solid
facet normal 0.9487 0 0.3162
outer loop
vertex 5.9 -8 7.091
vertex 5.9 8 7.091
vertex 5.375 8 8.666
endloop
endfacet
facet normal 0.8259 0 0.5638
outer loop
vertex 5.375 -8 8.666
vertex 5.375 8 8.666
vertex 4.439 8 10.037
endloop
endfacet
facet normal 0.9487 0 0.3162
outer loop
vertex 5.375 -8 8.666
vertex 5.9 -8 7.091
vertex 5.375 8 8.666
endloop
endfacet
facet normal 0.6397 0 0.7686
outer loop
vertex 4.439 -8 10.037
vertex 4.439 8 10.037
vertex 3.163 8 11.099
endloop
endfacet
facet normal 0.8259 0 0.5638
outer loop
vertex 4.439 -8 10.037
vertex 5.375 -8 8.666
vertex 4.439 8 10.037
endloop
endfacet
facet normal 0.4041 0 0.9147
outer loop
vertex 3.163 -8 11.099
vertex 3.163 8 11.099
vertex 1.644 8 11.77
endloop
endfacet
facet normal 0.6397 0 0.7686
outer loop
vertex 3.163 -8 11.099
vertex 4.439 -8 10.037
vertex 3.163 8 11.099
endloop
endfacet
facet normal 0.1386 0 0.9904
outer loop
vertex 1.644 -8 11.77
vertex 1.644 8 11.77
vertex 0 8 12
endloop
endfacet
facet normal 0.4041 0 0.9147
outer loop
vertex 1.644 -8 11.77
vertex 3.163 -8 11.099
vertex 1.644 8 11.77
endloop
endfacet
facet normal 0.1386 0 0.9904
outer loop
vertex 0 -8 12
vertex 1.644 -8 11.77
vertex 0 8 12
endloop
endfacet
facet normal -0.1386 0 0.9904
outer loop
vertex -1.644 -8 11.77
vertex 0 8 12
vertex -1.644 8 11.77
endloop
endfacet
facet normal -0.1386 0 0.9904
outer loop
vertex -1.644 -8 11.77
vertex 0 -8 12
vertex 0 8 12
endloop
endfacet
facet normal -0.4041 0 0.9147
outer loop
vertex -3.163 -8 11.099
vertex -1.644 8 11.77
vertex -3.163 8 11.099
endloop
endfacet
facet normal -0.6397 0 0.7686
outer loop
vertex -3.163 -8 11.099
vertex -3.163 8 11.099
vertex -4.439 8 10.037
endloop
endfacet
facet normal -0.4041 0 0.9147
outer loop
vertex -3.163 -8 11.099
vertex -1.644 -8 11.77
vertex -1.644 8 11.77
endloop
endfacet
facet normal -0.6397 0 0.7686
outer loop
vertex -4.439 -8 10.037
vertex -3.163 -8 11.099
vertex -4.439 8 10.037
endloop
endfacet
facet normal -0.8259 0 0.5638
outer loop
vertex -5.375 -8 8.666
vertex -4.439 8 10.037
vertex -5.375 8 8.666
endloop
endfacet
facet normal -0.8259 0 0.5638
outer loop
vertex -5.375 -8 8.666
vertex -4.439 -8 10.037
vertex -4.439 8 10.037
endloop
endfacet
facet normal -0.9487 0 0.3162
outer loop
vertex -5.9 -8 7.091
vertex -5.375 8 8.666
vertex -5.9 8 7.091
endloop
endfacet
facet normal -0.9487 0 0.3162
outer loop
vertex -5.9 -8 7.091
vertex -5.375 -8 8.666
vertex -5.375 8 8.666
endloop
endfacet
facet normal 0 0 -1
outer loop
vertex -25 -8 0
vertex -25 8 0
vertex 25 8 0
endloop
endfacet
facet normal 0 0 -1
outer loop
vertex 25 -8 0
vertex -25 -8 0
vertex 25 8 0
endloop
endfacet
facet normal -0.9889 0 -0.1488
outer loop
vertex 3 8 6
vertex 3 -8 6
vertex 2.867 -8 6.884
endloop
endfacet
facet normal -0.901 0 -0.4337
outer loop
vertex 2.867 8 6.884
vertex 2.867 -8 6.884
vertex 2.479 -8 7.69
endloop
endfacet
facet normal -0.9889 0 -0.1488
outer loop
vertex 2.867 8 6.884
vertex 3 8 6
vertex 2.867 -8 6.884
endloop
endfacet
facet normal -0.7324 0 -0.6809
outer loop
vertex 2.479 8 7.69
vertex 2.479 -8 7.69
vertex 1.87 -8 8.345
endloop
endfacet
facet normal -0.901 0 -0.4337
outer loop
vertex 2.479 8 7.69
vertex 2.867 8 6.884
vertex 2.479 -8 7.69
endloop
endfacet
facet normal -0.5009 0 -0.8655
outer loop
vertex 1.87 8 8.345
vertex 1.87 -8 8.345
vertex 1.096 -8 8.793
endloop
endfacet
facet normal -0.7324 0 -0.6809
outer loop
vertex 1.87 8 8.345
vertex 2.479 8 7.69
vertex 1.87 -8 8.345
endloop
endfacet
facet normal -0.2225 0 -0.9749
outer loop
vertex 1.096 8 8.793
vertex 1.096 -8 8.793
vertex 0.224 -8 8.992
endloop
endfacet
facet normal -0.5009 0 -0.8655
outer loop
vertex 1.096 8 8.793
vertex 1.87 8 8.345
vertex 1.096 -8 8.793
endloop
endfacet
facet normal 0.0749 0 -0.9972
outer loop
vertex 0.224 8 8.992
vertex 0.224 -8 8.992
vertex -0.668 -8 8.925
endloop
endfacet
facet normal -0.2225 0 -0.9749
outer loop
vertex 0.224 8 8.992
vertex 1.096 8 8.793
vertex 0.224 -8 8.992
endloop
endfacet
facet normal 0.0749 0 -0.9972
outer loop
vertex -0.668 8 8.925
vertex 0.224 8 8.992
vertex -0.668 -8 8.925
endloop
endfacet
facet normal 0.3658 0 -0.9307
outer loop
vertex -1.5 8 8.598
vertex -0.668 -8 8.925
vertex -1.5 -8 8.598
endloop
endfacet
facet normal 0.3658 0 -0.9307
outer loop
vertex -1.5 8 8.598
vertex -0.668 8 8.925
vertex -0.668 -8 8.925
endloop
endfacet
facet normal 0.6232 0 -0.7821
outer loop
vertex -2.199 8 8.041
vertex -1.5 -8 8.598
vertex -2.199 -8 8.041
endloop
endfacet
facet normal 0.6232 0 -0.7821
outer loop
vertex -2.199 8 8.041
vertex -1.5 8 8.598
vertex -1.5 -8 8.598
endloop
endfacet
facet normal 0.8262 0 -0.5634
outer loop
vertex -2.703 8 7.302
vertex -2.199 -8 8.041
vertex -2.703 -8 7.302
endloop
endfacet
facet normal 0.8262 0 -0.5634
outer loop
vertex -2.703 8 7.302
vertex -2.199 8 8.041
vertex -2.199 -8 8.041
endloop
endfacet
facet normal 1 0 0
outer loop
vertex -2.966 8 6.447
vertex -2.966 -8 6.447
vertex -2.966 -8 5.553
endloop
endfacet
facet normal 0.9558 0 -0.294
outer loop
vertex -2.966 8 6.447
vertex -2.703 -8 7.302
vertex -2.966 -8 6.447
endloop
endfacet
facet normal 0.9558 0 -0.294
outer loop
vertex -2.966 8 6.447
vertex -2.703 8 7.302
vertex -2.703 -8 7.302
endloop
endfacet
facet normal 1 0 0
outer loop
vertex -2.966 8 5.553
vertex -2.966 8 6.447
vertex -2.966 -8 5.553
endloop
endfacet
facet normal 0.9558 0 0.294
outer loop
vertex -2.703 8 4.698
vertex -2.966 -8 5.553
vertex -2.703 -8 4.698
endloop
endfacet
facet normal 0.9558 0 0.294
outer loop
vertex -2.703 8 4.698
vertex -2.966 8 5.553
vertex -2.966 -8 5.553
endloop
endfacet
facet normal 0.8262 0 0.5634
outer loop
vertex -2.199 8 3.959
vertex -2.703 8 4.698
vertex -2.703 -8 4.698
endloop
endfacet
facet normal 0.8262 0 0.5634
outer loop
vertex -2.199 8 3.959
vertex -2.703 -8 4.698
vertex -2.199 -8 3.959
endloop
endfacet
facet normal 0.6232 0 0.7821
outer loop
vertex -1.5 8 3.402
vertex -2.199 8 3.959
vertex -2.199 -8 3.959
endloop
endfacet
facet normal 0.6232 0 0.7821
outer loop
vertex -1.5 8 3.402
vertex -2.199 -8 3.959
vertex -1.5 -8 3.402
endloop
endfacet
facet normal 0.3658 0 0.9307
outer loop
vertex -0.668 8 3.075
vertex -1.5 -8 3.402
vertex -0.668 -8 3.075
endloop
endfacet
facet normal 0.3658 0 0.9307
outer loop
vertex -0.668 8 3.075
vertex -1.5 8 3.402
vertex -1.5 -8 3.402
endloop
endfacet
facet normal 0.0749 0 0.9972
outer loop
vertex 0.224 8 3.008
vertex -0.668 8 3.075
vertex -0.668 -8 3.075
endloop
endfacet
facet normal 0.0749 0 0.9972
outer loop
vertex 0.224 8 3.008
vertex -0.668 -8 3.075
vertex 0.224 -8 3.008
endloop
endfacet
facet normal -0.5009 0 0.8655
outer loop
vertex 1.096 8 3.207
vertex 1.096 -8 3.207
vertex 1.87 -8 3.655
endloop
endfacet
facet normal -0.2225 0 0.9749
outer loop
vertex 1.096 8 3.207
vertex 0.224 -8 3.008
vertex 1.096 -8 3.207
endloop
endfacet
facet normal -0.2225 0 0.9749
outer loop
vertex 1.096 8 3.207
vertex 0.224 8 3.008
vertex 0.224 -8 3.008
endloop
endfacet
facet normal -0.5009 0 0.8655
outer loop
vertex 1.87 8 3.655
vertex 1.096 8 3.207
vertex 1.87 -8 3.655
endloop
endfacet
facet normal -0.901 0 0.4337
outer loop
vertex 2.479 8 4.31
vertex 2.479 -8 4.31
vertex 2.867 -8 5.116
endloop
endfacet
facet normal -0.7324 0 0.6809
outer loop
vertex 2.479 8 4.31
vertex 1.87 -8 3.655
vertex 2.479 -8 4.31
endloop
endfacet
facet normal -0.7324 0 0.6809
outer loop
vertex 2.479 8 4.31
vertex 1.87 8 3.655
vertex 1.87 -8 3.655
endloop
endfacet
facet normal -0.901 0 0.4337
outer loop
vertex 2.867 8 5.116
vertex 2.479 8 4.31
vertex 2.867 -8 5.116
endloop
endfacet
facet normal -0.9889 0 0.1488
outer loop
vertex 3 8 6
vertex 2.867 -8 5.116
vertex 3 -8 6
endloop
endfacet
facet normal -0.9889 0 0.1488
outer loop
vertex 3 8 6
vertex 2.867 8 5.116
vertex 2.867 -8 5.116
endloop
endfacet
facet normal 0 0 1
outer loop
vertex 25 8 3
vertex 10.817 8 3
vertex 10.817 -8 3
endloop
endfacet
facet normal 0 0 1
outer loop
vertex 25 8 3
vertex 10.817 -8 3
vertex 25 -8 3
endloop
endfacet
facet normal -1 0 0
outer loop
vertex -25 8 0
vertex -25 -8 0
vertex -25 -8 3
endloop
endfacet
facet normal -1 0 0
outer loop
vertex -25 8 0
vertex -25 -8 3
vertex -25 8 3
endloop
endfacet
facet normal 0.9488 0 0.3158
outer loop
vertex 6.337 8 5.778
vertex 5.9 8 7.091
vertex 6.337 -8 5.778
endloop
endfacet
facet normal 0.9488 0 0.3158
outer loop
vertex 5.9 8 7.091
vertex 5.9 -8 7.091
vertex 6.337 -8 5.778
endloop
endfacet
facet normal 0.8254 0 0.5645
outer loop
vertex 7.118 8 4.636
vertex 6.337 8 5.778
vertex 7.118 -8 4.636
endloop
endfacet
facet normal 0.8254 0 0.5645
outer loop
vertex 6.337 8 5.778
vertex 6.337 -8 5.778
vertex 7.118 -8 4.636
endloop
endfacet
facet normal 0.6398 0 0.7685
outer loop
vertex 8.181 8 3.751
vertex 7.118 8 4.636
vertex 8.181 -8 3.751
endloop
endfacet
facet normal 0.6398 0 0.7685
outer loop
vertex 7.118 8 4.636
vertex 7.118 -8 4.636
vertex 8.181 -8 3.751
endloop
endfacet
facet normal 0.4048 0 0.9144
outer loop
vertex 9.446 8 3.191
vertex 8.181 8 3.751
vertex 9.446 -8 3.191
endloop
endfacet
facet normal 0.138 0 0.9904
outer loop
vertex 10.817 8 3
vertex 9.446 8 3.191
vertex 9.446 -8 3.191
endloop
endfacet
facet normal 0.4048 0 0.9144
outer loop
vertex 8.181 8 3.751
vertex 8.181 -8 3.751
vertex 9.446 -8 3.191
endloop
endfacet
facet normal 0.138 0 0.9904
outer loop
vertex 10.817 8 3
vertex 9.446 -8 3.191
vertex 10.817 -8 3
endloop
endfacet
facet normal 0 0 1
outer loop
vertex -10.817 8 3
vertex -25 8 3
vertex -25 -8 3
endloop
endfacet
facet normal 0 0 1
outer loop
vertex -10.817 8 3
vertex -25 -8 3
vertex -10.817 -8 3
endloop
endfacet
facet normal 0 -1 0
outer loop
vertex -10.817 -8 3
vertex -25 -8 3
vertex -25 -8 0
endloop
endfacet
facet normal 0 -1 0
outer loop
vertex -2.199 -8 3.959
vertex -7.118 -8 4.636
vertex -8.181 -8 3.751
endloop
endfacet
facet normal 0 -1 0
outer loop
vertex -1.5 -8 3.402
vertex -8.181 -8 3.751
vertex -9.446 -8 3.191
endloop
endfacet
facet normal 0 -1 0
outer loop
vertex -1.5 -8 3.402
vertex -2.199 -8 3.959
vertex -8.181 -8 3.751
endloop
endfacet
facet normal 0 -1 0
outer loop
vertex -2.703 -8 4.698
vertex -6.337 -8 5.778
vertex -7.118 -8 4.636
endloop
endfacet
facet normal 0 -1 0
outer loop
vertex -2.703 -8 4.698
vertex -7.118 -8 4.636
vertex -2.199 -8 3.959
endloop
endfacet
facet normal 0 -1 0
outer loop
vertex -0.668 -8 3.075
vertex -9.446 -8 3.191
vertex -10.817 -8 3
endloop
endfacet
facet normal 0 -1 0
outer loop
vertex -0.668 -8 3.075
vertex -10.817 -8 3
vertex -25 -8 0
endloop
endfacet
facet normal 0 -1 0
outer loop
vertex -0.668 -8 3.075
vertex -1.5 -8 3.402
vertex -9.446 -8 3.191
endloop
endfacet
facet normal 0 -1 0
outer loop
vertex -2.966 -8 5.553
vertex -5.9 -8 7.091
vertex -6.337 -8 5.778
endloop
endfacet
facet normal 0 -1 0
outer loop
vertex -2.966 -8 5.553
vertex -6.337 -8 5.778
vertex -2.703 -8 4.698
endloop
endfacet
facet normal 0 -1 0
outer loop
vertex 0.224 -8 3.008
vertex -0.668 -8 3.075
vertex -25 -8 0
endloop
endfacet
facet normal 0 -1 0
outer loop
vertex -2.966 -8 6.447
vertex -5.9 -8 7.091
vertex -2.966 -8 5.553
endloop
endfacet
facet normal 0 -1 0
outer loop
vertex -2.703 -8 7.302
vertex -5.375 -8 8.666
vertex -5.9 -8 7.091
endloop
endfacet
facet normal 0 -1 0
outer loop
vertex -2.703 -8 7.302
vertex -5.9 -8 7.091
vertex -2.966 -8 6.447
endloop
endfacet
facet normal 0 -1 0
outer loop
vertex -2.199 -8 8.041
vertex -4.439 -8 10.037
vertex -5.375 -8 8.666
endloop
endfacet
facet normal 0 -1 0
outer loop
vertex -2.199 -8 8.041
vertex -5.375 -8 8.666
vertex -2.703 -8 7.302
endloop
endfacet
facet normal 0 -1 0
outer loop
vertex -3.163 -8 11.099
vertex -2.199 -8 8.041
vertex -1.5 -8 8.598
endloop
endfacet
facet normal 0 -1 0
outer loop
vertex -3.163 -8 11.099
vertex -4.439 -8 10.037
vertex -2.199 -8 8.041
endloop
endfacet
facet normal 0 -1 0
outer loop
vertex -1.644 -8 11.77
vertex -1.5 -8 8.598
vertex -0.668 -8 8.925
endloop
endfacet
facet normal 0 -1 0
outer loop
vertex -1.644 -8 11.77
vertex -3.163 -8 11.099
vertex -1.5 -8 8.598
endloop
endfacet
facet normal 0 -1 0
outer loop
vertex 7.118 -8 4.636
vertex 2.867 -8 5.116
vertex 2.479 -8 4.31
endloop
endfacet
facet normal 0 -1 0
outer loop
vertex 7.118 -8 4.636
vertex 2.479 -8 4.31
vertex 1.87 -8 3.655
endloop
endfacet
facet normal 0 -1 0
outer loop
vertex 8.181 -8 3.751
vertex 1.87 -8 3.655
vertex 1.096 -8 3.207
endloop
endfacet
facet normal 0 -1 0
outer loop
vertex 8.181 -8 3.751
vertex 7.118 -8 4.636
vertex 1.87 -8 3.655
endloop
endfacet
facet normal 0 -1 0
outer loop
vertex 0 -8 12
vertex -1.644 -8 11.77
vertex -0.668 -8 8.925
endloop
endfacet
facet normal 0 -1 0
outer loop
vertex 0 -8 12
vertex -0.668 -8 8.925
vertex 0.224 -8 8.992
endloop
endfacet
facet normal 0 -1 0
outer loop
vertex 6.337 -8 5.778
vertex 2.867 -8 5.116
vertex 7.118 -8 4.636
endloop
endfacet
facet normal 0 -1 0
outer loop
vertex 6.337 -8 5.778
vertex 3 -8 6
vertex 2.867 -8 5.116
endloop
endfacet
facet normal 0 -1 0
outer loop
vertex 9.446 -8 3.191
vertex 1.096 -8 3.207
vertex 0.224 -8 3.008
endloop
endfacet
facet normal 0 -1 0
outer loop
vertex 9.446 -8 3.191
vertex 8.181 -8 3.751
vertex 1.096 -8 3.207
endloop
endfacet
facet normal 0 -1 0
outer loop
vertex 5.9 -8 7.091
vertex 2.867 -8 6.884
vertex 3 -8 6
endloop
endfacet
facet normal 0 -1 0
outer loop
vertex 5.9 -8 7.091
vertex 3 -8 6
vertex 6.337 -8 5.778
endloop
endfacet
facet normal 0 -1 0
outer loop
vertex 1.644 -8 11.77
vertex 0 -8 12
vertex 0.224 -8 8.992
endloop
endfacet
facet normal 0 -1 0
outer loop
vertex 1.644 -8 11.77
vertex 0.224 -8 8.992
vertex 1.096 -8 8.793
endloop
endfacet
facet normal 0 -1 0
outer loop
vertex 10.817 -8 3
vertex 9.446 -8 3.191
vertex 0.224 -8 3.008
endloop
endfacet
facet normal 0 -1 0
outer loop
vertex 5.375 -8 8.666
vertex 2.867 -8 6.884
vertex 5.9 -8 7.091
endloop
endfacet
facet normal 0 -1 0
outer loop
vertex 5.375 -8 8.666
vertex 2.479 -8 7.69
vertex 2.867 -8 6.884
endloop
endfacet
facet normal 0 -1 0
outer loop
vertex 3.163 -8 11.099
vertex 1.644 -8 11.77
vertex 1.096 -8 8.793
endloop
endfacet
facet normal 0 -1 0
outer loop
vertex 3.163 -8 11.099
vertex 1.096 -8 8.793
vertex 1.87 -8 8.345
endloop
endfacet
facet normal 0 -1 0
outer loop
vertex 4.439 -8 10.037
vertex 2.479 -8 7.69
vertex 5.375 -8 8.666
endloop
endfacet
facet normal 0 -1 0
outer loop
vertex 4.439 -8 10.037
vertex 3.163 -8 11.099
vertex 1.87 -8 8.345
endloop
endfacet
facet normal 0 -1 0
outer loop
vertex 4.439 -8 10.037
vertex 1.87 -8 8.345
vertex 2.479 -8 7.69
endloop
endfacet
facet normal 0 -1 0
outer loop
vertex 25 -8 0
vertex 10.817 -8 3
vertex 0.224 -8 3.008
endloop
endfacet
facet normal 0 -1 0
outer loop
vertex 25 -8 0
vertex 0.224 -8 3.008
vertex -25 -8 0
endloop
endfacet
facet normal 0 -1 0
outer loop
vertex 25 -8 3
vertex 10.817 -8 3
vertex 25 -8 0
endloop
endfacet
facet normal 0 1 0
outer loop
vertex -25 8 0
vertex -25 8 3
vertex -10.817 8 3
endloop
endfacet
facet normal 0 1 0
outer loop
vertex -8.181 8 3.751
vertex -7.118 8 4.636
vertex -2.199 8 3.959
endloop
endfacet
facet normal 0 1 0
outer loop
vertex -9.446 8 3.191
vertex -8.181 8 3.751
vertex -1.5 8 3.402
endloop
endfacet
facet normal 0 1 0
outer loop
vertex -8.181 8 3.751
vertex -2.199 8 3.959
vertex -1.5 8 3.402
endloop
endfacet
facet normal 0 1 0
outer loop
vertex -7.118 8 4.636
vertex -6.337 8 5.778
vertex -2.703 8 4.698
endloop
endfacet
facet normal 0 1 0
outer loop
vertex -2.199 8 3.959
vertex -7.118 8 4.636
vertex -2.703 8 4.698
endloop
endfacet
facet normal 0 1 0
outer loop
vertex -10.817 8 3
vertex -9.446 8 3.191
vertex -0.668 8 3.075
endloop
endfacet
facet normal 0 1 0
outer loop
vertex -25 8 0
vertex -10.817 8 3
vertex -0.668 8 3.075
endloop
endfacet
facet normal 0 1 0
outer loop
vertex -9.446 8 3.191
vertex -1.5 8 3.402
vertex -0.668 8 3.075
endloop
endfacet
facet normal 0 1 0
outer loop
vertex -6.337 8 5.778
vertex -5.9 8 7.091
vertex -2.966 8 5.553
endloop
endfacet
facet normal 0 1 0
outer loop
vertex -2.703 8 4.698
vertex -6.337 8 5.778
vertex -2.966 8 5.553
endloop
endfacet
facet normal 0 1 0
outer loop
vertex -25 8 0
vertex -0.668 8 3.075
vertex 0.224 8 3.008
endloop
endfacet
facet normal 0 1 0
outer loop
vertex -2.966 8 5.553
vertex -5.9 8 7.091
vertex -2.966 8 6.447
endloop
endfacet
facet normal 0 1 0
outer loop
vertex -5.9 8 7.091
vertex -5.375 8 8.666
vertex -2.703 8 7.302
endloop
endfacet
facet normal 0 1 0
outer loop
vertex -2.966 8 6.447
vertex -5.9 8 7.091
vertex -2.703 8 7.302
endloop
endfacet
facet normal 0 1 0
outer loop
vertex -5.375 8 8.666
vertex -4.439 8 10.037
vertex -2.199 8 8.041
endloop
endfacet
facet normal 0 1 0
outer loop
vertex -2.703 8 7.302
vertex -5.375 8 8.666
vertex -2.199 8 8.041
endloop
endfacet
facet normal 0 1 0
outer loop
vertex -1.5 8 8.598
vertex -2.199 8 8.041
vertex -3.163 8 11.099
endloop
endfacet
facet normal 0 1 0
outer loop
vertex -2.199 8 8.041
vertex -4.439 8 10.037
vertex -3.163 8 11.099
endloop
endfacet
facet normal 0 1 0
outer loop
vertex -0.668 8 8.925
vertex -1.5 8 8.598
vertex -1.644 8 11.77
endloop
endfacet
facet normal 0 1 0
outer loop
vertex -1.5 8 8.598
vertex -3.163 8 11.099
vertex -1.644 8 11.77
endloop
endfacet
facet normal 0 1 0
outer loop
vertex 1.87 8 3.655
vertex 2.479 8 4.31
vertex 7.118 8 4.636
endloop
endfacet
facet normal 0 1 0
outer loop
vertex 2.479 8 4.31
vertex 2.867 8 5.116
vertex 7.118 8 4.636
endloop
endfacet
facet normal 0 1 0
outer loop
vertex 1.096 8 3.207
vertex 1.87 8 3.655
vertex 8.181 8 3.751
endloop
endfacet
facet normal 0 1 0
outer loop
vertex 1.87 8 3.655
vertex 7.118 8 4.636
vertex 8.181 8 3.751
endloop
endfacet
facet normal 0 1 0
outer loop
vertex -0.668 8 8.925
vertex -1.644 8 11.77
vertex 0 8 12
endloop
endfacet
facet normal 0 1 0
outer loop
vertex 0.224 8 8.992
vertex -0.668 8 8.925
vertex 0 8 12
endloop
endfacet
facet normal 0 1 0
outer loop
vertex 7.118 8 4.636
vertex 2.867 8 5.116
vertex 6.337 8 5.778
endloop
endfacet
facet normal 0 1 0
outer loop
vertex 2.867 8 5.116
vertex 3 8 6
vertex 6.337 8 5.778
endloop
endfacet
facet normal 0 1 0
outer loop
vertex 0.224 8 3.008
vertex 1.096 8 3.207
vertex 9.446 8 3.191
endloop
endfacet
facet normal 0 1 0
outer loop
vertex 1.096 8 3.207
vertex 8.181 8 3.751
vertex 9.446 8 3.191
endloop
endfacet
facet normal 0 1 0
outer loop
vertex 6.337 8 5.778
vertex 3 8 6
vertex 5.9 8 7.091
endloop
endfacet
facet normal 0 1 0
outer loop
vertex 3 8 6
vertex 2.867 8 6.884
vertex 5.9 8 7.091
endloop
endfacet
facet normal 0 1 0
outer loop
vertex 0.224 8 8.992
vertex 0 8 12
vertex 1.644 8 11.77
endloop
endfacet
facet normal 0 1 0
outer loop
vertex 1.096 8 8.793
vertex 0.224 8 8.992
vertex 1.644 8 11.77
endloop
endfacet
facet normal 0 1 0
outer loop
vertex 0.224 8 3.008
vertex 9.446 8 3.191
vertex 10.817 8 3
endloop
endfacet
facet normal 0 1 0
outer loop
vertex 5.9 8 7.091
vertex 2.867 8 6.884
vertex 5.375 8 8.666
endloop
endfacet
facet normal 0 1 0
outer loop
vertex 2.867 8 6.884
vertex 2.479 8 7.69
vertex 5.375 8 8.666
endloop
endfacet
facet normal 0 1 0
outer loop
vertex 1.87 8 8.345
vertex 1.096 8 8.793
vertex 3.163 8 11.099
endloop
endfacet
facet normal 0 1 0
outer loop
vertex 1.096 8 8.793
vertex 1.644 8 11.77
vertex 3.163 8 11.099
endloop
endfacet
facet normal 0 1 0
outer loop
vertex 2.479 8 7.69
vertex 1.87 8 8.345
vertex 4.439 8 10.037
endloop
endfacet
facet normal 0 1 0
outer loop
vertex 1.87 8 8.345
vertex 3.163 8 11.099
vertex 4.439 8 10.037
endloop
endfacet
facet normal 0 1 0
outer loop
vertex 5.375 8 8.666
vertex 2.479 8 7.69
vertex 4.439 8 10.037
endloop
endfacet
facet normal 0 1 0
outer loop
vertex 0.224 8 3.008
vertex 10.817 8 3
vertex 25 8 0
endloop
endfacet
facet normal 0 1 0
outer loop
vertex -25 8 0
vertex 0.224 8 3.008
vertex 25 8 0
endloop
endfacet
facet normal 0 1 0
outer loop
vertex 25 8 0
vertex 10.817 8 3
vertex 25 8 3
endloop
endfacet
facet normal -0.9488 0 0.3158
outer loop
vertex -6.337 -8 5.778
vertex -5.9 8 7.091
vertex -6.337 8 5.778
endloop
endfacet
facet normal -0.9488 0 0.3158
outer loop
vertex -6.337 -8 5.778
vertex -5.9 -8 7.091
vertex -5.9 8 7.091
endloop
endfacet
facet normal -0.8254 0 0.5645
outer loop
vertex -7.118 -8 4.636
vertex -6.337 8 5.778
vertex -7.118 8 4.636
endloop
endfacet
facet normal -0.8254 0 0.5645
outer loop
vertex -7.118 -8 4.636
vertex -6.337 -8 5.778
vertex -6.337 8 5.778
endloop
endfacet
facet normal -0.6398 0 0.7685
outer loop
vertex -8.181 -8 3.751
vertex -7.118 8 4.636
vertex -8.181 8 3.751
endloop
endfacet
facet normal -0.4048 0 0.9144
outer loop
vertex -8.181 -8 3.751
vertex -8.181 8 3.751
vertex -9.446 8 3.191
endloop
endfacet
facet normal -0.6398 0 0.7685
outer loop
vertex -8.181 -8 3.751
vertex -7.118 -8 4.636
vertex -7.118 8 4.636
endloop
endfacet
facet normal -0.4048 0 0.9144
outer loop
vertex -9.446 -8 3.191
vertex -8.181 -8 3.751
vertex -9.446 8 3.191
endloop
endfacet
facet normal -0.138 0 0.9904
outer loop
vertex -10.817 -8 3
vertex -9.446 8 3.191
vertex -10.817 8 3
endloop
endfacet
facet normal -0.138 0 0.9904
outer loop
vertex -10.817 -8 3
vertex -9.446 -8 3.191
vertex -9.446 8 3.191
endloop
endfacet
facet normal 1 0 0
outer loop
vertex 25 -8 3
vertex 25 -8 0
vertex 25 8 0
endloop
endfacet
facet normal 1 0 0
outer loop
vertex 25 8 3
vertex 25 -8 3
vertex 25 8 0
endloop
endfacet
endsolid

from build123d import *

# Parameters (mm, degrees)
F0_W     = 50
F0_H     = 16
F1_DEPTH = 3
F2_R     = 6
F2_R_2   = 3
F3_DEPTH = 8
F4_R     = 5


with BuildPart() as f1:
    # F0 (on Top) → F1 (new body)
    with BuildSketch(Plane.XY):
        Rectangle(F0_W, F0_H)
    extrude(amount=F1_DEPTH)

    # F2 (on Front) → F3 (join, symmetric)
    with BuildSketch(Plane.XZ):
        with Locations((0, 6)):
            Circle(F2_R)
        with Locations((0, 6)):
            Circle(F2_R_2, mode=Mode.SUBTRACT)
    extrude(amount=F3_DEPTH, both=True)

    # F4
    f4_edges = [f1.edges().sort_by_distance(p)[0] for p in [
        (-5.196152, 0, 3),
        (5.196152, 0, 3),
    ]]
    fillet(f4_edges, radius=F4_R)


solid = f1.part
